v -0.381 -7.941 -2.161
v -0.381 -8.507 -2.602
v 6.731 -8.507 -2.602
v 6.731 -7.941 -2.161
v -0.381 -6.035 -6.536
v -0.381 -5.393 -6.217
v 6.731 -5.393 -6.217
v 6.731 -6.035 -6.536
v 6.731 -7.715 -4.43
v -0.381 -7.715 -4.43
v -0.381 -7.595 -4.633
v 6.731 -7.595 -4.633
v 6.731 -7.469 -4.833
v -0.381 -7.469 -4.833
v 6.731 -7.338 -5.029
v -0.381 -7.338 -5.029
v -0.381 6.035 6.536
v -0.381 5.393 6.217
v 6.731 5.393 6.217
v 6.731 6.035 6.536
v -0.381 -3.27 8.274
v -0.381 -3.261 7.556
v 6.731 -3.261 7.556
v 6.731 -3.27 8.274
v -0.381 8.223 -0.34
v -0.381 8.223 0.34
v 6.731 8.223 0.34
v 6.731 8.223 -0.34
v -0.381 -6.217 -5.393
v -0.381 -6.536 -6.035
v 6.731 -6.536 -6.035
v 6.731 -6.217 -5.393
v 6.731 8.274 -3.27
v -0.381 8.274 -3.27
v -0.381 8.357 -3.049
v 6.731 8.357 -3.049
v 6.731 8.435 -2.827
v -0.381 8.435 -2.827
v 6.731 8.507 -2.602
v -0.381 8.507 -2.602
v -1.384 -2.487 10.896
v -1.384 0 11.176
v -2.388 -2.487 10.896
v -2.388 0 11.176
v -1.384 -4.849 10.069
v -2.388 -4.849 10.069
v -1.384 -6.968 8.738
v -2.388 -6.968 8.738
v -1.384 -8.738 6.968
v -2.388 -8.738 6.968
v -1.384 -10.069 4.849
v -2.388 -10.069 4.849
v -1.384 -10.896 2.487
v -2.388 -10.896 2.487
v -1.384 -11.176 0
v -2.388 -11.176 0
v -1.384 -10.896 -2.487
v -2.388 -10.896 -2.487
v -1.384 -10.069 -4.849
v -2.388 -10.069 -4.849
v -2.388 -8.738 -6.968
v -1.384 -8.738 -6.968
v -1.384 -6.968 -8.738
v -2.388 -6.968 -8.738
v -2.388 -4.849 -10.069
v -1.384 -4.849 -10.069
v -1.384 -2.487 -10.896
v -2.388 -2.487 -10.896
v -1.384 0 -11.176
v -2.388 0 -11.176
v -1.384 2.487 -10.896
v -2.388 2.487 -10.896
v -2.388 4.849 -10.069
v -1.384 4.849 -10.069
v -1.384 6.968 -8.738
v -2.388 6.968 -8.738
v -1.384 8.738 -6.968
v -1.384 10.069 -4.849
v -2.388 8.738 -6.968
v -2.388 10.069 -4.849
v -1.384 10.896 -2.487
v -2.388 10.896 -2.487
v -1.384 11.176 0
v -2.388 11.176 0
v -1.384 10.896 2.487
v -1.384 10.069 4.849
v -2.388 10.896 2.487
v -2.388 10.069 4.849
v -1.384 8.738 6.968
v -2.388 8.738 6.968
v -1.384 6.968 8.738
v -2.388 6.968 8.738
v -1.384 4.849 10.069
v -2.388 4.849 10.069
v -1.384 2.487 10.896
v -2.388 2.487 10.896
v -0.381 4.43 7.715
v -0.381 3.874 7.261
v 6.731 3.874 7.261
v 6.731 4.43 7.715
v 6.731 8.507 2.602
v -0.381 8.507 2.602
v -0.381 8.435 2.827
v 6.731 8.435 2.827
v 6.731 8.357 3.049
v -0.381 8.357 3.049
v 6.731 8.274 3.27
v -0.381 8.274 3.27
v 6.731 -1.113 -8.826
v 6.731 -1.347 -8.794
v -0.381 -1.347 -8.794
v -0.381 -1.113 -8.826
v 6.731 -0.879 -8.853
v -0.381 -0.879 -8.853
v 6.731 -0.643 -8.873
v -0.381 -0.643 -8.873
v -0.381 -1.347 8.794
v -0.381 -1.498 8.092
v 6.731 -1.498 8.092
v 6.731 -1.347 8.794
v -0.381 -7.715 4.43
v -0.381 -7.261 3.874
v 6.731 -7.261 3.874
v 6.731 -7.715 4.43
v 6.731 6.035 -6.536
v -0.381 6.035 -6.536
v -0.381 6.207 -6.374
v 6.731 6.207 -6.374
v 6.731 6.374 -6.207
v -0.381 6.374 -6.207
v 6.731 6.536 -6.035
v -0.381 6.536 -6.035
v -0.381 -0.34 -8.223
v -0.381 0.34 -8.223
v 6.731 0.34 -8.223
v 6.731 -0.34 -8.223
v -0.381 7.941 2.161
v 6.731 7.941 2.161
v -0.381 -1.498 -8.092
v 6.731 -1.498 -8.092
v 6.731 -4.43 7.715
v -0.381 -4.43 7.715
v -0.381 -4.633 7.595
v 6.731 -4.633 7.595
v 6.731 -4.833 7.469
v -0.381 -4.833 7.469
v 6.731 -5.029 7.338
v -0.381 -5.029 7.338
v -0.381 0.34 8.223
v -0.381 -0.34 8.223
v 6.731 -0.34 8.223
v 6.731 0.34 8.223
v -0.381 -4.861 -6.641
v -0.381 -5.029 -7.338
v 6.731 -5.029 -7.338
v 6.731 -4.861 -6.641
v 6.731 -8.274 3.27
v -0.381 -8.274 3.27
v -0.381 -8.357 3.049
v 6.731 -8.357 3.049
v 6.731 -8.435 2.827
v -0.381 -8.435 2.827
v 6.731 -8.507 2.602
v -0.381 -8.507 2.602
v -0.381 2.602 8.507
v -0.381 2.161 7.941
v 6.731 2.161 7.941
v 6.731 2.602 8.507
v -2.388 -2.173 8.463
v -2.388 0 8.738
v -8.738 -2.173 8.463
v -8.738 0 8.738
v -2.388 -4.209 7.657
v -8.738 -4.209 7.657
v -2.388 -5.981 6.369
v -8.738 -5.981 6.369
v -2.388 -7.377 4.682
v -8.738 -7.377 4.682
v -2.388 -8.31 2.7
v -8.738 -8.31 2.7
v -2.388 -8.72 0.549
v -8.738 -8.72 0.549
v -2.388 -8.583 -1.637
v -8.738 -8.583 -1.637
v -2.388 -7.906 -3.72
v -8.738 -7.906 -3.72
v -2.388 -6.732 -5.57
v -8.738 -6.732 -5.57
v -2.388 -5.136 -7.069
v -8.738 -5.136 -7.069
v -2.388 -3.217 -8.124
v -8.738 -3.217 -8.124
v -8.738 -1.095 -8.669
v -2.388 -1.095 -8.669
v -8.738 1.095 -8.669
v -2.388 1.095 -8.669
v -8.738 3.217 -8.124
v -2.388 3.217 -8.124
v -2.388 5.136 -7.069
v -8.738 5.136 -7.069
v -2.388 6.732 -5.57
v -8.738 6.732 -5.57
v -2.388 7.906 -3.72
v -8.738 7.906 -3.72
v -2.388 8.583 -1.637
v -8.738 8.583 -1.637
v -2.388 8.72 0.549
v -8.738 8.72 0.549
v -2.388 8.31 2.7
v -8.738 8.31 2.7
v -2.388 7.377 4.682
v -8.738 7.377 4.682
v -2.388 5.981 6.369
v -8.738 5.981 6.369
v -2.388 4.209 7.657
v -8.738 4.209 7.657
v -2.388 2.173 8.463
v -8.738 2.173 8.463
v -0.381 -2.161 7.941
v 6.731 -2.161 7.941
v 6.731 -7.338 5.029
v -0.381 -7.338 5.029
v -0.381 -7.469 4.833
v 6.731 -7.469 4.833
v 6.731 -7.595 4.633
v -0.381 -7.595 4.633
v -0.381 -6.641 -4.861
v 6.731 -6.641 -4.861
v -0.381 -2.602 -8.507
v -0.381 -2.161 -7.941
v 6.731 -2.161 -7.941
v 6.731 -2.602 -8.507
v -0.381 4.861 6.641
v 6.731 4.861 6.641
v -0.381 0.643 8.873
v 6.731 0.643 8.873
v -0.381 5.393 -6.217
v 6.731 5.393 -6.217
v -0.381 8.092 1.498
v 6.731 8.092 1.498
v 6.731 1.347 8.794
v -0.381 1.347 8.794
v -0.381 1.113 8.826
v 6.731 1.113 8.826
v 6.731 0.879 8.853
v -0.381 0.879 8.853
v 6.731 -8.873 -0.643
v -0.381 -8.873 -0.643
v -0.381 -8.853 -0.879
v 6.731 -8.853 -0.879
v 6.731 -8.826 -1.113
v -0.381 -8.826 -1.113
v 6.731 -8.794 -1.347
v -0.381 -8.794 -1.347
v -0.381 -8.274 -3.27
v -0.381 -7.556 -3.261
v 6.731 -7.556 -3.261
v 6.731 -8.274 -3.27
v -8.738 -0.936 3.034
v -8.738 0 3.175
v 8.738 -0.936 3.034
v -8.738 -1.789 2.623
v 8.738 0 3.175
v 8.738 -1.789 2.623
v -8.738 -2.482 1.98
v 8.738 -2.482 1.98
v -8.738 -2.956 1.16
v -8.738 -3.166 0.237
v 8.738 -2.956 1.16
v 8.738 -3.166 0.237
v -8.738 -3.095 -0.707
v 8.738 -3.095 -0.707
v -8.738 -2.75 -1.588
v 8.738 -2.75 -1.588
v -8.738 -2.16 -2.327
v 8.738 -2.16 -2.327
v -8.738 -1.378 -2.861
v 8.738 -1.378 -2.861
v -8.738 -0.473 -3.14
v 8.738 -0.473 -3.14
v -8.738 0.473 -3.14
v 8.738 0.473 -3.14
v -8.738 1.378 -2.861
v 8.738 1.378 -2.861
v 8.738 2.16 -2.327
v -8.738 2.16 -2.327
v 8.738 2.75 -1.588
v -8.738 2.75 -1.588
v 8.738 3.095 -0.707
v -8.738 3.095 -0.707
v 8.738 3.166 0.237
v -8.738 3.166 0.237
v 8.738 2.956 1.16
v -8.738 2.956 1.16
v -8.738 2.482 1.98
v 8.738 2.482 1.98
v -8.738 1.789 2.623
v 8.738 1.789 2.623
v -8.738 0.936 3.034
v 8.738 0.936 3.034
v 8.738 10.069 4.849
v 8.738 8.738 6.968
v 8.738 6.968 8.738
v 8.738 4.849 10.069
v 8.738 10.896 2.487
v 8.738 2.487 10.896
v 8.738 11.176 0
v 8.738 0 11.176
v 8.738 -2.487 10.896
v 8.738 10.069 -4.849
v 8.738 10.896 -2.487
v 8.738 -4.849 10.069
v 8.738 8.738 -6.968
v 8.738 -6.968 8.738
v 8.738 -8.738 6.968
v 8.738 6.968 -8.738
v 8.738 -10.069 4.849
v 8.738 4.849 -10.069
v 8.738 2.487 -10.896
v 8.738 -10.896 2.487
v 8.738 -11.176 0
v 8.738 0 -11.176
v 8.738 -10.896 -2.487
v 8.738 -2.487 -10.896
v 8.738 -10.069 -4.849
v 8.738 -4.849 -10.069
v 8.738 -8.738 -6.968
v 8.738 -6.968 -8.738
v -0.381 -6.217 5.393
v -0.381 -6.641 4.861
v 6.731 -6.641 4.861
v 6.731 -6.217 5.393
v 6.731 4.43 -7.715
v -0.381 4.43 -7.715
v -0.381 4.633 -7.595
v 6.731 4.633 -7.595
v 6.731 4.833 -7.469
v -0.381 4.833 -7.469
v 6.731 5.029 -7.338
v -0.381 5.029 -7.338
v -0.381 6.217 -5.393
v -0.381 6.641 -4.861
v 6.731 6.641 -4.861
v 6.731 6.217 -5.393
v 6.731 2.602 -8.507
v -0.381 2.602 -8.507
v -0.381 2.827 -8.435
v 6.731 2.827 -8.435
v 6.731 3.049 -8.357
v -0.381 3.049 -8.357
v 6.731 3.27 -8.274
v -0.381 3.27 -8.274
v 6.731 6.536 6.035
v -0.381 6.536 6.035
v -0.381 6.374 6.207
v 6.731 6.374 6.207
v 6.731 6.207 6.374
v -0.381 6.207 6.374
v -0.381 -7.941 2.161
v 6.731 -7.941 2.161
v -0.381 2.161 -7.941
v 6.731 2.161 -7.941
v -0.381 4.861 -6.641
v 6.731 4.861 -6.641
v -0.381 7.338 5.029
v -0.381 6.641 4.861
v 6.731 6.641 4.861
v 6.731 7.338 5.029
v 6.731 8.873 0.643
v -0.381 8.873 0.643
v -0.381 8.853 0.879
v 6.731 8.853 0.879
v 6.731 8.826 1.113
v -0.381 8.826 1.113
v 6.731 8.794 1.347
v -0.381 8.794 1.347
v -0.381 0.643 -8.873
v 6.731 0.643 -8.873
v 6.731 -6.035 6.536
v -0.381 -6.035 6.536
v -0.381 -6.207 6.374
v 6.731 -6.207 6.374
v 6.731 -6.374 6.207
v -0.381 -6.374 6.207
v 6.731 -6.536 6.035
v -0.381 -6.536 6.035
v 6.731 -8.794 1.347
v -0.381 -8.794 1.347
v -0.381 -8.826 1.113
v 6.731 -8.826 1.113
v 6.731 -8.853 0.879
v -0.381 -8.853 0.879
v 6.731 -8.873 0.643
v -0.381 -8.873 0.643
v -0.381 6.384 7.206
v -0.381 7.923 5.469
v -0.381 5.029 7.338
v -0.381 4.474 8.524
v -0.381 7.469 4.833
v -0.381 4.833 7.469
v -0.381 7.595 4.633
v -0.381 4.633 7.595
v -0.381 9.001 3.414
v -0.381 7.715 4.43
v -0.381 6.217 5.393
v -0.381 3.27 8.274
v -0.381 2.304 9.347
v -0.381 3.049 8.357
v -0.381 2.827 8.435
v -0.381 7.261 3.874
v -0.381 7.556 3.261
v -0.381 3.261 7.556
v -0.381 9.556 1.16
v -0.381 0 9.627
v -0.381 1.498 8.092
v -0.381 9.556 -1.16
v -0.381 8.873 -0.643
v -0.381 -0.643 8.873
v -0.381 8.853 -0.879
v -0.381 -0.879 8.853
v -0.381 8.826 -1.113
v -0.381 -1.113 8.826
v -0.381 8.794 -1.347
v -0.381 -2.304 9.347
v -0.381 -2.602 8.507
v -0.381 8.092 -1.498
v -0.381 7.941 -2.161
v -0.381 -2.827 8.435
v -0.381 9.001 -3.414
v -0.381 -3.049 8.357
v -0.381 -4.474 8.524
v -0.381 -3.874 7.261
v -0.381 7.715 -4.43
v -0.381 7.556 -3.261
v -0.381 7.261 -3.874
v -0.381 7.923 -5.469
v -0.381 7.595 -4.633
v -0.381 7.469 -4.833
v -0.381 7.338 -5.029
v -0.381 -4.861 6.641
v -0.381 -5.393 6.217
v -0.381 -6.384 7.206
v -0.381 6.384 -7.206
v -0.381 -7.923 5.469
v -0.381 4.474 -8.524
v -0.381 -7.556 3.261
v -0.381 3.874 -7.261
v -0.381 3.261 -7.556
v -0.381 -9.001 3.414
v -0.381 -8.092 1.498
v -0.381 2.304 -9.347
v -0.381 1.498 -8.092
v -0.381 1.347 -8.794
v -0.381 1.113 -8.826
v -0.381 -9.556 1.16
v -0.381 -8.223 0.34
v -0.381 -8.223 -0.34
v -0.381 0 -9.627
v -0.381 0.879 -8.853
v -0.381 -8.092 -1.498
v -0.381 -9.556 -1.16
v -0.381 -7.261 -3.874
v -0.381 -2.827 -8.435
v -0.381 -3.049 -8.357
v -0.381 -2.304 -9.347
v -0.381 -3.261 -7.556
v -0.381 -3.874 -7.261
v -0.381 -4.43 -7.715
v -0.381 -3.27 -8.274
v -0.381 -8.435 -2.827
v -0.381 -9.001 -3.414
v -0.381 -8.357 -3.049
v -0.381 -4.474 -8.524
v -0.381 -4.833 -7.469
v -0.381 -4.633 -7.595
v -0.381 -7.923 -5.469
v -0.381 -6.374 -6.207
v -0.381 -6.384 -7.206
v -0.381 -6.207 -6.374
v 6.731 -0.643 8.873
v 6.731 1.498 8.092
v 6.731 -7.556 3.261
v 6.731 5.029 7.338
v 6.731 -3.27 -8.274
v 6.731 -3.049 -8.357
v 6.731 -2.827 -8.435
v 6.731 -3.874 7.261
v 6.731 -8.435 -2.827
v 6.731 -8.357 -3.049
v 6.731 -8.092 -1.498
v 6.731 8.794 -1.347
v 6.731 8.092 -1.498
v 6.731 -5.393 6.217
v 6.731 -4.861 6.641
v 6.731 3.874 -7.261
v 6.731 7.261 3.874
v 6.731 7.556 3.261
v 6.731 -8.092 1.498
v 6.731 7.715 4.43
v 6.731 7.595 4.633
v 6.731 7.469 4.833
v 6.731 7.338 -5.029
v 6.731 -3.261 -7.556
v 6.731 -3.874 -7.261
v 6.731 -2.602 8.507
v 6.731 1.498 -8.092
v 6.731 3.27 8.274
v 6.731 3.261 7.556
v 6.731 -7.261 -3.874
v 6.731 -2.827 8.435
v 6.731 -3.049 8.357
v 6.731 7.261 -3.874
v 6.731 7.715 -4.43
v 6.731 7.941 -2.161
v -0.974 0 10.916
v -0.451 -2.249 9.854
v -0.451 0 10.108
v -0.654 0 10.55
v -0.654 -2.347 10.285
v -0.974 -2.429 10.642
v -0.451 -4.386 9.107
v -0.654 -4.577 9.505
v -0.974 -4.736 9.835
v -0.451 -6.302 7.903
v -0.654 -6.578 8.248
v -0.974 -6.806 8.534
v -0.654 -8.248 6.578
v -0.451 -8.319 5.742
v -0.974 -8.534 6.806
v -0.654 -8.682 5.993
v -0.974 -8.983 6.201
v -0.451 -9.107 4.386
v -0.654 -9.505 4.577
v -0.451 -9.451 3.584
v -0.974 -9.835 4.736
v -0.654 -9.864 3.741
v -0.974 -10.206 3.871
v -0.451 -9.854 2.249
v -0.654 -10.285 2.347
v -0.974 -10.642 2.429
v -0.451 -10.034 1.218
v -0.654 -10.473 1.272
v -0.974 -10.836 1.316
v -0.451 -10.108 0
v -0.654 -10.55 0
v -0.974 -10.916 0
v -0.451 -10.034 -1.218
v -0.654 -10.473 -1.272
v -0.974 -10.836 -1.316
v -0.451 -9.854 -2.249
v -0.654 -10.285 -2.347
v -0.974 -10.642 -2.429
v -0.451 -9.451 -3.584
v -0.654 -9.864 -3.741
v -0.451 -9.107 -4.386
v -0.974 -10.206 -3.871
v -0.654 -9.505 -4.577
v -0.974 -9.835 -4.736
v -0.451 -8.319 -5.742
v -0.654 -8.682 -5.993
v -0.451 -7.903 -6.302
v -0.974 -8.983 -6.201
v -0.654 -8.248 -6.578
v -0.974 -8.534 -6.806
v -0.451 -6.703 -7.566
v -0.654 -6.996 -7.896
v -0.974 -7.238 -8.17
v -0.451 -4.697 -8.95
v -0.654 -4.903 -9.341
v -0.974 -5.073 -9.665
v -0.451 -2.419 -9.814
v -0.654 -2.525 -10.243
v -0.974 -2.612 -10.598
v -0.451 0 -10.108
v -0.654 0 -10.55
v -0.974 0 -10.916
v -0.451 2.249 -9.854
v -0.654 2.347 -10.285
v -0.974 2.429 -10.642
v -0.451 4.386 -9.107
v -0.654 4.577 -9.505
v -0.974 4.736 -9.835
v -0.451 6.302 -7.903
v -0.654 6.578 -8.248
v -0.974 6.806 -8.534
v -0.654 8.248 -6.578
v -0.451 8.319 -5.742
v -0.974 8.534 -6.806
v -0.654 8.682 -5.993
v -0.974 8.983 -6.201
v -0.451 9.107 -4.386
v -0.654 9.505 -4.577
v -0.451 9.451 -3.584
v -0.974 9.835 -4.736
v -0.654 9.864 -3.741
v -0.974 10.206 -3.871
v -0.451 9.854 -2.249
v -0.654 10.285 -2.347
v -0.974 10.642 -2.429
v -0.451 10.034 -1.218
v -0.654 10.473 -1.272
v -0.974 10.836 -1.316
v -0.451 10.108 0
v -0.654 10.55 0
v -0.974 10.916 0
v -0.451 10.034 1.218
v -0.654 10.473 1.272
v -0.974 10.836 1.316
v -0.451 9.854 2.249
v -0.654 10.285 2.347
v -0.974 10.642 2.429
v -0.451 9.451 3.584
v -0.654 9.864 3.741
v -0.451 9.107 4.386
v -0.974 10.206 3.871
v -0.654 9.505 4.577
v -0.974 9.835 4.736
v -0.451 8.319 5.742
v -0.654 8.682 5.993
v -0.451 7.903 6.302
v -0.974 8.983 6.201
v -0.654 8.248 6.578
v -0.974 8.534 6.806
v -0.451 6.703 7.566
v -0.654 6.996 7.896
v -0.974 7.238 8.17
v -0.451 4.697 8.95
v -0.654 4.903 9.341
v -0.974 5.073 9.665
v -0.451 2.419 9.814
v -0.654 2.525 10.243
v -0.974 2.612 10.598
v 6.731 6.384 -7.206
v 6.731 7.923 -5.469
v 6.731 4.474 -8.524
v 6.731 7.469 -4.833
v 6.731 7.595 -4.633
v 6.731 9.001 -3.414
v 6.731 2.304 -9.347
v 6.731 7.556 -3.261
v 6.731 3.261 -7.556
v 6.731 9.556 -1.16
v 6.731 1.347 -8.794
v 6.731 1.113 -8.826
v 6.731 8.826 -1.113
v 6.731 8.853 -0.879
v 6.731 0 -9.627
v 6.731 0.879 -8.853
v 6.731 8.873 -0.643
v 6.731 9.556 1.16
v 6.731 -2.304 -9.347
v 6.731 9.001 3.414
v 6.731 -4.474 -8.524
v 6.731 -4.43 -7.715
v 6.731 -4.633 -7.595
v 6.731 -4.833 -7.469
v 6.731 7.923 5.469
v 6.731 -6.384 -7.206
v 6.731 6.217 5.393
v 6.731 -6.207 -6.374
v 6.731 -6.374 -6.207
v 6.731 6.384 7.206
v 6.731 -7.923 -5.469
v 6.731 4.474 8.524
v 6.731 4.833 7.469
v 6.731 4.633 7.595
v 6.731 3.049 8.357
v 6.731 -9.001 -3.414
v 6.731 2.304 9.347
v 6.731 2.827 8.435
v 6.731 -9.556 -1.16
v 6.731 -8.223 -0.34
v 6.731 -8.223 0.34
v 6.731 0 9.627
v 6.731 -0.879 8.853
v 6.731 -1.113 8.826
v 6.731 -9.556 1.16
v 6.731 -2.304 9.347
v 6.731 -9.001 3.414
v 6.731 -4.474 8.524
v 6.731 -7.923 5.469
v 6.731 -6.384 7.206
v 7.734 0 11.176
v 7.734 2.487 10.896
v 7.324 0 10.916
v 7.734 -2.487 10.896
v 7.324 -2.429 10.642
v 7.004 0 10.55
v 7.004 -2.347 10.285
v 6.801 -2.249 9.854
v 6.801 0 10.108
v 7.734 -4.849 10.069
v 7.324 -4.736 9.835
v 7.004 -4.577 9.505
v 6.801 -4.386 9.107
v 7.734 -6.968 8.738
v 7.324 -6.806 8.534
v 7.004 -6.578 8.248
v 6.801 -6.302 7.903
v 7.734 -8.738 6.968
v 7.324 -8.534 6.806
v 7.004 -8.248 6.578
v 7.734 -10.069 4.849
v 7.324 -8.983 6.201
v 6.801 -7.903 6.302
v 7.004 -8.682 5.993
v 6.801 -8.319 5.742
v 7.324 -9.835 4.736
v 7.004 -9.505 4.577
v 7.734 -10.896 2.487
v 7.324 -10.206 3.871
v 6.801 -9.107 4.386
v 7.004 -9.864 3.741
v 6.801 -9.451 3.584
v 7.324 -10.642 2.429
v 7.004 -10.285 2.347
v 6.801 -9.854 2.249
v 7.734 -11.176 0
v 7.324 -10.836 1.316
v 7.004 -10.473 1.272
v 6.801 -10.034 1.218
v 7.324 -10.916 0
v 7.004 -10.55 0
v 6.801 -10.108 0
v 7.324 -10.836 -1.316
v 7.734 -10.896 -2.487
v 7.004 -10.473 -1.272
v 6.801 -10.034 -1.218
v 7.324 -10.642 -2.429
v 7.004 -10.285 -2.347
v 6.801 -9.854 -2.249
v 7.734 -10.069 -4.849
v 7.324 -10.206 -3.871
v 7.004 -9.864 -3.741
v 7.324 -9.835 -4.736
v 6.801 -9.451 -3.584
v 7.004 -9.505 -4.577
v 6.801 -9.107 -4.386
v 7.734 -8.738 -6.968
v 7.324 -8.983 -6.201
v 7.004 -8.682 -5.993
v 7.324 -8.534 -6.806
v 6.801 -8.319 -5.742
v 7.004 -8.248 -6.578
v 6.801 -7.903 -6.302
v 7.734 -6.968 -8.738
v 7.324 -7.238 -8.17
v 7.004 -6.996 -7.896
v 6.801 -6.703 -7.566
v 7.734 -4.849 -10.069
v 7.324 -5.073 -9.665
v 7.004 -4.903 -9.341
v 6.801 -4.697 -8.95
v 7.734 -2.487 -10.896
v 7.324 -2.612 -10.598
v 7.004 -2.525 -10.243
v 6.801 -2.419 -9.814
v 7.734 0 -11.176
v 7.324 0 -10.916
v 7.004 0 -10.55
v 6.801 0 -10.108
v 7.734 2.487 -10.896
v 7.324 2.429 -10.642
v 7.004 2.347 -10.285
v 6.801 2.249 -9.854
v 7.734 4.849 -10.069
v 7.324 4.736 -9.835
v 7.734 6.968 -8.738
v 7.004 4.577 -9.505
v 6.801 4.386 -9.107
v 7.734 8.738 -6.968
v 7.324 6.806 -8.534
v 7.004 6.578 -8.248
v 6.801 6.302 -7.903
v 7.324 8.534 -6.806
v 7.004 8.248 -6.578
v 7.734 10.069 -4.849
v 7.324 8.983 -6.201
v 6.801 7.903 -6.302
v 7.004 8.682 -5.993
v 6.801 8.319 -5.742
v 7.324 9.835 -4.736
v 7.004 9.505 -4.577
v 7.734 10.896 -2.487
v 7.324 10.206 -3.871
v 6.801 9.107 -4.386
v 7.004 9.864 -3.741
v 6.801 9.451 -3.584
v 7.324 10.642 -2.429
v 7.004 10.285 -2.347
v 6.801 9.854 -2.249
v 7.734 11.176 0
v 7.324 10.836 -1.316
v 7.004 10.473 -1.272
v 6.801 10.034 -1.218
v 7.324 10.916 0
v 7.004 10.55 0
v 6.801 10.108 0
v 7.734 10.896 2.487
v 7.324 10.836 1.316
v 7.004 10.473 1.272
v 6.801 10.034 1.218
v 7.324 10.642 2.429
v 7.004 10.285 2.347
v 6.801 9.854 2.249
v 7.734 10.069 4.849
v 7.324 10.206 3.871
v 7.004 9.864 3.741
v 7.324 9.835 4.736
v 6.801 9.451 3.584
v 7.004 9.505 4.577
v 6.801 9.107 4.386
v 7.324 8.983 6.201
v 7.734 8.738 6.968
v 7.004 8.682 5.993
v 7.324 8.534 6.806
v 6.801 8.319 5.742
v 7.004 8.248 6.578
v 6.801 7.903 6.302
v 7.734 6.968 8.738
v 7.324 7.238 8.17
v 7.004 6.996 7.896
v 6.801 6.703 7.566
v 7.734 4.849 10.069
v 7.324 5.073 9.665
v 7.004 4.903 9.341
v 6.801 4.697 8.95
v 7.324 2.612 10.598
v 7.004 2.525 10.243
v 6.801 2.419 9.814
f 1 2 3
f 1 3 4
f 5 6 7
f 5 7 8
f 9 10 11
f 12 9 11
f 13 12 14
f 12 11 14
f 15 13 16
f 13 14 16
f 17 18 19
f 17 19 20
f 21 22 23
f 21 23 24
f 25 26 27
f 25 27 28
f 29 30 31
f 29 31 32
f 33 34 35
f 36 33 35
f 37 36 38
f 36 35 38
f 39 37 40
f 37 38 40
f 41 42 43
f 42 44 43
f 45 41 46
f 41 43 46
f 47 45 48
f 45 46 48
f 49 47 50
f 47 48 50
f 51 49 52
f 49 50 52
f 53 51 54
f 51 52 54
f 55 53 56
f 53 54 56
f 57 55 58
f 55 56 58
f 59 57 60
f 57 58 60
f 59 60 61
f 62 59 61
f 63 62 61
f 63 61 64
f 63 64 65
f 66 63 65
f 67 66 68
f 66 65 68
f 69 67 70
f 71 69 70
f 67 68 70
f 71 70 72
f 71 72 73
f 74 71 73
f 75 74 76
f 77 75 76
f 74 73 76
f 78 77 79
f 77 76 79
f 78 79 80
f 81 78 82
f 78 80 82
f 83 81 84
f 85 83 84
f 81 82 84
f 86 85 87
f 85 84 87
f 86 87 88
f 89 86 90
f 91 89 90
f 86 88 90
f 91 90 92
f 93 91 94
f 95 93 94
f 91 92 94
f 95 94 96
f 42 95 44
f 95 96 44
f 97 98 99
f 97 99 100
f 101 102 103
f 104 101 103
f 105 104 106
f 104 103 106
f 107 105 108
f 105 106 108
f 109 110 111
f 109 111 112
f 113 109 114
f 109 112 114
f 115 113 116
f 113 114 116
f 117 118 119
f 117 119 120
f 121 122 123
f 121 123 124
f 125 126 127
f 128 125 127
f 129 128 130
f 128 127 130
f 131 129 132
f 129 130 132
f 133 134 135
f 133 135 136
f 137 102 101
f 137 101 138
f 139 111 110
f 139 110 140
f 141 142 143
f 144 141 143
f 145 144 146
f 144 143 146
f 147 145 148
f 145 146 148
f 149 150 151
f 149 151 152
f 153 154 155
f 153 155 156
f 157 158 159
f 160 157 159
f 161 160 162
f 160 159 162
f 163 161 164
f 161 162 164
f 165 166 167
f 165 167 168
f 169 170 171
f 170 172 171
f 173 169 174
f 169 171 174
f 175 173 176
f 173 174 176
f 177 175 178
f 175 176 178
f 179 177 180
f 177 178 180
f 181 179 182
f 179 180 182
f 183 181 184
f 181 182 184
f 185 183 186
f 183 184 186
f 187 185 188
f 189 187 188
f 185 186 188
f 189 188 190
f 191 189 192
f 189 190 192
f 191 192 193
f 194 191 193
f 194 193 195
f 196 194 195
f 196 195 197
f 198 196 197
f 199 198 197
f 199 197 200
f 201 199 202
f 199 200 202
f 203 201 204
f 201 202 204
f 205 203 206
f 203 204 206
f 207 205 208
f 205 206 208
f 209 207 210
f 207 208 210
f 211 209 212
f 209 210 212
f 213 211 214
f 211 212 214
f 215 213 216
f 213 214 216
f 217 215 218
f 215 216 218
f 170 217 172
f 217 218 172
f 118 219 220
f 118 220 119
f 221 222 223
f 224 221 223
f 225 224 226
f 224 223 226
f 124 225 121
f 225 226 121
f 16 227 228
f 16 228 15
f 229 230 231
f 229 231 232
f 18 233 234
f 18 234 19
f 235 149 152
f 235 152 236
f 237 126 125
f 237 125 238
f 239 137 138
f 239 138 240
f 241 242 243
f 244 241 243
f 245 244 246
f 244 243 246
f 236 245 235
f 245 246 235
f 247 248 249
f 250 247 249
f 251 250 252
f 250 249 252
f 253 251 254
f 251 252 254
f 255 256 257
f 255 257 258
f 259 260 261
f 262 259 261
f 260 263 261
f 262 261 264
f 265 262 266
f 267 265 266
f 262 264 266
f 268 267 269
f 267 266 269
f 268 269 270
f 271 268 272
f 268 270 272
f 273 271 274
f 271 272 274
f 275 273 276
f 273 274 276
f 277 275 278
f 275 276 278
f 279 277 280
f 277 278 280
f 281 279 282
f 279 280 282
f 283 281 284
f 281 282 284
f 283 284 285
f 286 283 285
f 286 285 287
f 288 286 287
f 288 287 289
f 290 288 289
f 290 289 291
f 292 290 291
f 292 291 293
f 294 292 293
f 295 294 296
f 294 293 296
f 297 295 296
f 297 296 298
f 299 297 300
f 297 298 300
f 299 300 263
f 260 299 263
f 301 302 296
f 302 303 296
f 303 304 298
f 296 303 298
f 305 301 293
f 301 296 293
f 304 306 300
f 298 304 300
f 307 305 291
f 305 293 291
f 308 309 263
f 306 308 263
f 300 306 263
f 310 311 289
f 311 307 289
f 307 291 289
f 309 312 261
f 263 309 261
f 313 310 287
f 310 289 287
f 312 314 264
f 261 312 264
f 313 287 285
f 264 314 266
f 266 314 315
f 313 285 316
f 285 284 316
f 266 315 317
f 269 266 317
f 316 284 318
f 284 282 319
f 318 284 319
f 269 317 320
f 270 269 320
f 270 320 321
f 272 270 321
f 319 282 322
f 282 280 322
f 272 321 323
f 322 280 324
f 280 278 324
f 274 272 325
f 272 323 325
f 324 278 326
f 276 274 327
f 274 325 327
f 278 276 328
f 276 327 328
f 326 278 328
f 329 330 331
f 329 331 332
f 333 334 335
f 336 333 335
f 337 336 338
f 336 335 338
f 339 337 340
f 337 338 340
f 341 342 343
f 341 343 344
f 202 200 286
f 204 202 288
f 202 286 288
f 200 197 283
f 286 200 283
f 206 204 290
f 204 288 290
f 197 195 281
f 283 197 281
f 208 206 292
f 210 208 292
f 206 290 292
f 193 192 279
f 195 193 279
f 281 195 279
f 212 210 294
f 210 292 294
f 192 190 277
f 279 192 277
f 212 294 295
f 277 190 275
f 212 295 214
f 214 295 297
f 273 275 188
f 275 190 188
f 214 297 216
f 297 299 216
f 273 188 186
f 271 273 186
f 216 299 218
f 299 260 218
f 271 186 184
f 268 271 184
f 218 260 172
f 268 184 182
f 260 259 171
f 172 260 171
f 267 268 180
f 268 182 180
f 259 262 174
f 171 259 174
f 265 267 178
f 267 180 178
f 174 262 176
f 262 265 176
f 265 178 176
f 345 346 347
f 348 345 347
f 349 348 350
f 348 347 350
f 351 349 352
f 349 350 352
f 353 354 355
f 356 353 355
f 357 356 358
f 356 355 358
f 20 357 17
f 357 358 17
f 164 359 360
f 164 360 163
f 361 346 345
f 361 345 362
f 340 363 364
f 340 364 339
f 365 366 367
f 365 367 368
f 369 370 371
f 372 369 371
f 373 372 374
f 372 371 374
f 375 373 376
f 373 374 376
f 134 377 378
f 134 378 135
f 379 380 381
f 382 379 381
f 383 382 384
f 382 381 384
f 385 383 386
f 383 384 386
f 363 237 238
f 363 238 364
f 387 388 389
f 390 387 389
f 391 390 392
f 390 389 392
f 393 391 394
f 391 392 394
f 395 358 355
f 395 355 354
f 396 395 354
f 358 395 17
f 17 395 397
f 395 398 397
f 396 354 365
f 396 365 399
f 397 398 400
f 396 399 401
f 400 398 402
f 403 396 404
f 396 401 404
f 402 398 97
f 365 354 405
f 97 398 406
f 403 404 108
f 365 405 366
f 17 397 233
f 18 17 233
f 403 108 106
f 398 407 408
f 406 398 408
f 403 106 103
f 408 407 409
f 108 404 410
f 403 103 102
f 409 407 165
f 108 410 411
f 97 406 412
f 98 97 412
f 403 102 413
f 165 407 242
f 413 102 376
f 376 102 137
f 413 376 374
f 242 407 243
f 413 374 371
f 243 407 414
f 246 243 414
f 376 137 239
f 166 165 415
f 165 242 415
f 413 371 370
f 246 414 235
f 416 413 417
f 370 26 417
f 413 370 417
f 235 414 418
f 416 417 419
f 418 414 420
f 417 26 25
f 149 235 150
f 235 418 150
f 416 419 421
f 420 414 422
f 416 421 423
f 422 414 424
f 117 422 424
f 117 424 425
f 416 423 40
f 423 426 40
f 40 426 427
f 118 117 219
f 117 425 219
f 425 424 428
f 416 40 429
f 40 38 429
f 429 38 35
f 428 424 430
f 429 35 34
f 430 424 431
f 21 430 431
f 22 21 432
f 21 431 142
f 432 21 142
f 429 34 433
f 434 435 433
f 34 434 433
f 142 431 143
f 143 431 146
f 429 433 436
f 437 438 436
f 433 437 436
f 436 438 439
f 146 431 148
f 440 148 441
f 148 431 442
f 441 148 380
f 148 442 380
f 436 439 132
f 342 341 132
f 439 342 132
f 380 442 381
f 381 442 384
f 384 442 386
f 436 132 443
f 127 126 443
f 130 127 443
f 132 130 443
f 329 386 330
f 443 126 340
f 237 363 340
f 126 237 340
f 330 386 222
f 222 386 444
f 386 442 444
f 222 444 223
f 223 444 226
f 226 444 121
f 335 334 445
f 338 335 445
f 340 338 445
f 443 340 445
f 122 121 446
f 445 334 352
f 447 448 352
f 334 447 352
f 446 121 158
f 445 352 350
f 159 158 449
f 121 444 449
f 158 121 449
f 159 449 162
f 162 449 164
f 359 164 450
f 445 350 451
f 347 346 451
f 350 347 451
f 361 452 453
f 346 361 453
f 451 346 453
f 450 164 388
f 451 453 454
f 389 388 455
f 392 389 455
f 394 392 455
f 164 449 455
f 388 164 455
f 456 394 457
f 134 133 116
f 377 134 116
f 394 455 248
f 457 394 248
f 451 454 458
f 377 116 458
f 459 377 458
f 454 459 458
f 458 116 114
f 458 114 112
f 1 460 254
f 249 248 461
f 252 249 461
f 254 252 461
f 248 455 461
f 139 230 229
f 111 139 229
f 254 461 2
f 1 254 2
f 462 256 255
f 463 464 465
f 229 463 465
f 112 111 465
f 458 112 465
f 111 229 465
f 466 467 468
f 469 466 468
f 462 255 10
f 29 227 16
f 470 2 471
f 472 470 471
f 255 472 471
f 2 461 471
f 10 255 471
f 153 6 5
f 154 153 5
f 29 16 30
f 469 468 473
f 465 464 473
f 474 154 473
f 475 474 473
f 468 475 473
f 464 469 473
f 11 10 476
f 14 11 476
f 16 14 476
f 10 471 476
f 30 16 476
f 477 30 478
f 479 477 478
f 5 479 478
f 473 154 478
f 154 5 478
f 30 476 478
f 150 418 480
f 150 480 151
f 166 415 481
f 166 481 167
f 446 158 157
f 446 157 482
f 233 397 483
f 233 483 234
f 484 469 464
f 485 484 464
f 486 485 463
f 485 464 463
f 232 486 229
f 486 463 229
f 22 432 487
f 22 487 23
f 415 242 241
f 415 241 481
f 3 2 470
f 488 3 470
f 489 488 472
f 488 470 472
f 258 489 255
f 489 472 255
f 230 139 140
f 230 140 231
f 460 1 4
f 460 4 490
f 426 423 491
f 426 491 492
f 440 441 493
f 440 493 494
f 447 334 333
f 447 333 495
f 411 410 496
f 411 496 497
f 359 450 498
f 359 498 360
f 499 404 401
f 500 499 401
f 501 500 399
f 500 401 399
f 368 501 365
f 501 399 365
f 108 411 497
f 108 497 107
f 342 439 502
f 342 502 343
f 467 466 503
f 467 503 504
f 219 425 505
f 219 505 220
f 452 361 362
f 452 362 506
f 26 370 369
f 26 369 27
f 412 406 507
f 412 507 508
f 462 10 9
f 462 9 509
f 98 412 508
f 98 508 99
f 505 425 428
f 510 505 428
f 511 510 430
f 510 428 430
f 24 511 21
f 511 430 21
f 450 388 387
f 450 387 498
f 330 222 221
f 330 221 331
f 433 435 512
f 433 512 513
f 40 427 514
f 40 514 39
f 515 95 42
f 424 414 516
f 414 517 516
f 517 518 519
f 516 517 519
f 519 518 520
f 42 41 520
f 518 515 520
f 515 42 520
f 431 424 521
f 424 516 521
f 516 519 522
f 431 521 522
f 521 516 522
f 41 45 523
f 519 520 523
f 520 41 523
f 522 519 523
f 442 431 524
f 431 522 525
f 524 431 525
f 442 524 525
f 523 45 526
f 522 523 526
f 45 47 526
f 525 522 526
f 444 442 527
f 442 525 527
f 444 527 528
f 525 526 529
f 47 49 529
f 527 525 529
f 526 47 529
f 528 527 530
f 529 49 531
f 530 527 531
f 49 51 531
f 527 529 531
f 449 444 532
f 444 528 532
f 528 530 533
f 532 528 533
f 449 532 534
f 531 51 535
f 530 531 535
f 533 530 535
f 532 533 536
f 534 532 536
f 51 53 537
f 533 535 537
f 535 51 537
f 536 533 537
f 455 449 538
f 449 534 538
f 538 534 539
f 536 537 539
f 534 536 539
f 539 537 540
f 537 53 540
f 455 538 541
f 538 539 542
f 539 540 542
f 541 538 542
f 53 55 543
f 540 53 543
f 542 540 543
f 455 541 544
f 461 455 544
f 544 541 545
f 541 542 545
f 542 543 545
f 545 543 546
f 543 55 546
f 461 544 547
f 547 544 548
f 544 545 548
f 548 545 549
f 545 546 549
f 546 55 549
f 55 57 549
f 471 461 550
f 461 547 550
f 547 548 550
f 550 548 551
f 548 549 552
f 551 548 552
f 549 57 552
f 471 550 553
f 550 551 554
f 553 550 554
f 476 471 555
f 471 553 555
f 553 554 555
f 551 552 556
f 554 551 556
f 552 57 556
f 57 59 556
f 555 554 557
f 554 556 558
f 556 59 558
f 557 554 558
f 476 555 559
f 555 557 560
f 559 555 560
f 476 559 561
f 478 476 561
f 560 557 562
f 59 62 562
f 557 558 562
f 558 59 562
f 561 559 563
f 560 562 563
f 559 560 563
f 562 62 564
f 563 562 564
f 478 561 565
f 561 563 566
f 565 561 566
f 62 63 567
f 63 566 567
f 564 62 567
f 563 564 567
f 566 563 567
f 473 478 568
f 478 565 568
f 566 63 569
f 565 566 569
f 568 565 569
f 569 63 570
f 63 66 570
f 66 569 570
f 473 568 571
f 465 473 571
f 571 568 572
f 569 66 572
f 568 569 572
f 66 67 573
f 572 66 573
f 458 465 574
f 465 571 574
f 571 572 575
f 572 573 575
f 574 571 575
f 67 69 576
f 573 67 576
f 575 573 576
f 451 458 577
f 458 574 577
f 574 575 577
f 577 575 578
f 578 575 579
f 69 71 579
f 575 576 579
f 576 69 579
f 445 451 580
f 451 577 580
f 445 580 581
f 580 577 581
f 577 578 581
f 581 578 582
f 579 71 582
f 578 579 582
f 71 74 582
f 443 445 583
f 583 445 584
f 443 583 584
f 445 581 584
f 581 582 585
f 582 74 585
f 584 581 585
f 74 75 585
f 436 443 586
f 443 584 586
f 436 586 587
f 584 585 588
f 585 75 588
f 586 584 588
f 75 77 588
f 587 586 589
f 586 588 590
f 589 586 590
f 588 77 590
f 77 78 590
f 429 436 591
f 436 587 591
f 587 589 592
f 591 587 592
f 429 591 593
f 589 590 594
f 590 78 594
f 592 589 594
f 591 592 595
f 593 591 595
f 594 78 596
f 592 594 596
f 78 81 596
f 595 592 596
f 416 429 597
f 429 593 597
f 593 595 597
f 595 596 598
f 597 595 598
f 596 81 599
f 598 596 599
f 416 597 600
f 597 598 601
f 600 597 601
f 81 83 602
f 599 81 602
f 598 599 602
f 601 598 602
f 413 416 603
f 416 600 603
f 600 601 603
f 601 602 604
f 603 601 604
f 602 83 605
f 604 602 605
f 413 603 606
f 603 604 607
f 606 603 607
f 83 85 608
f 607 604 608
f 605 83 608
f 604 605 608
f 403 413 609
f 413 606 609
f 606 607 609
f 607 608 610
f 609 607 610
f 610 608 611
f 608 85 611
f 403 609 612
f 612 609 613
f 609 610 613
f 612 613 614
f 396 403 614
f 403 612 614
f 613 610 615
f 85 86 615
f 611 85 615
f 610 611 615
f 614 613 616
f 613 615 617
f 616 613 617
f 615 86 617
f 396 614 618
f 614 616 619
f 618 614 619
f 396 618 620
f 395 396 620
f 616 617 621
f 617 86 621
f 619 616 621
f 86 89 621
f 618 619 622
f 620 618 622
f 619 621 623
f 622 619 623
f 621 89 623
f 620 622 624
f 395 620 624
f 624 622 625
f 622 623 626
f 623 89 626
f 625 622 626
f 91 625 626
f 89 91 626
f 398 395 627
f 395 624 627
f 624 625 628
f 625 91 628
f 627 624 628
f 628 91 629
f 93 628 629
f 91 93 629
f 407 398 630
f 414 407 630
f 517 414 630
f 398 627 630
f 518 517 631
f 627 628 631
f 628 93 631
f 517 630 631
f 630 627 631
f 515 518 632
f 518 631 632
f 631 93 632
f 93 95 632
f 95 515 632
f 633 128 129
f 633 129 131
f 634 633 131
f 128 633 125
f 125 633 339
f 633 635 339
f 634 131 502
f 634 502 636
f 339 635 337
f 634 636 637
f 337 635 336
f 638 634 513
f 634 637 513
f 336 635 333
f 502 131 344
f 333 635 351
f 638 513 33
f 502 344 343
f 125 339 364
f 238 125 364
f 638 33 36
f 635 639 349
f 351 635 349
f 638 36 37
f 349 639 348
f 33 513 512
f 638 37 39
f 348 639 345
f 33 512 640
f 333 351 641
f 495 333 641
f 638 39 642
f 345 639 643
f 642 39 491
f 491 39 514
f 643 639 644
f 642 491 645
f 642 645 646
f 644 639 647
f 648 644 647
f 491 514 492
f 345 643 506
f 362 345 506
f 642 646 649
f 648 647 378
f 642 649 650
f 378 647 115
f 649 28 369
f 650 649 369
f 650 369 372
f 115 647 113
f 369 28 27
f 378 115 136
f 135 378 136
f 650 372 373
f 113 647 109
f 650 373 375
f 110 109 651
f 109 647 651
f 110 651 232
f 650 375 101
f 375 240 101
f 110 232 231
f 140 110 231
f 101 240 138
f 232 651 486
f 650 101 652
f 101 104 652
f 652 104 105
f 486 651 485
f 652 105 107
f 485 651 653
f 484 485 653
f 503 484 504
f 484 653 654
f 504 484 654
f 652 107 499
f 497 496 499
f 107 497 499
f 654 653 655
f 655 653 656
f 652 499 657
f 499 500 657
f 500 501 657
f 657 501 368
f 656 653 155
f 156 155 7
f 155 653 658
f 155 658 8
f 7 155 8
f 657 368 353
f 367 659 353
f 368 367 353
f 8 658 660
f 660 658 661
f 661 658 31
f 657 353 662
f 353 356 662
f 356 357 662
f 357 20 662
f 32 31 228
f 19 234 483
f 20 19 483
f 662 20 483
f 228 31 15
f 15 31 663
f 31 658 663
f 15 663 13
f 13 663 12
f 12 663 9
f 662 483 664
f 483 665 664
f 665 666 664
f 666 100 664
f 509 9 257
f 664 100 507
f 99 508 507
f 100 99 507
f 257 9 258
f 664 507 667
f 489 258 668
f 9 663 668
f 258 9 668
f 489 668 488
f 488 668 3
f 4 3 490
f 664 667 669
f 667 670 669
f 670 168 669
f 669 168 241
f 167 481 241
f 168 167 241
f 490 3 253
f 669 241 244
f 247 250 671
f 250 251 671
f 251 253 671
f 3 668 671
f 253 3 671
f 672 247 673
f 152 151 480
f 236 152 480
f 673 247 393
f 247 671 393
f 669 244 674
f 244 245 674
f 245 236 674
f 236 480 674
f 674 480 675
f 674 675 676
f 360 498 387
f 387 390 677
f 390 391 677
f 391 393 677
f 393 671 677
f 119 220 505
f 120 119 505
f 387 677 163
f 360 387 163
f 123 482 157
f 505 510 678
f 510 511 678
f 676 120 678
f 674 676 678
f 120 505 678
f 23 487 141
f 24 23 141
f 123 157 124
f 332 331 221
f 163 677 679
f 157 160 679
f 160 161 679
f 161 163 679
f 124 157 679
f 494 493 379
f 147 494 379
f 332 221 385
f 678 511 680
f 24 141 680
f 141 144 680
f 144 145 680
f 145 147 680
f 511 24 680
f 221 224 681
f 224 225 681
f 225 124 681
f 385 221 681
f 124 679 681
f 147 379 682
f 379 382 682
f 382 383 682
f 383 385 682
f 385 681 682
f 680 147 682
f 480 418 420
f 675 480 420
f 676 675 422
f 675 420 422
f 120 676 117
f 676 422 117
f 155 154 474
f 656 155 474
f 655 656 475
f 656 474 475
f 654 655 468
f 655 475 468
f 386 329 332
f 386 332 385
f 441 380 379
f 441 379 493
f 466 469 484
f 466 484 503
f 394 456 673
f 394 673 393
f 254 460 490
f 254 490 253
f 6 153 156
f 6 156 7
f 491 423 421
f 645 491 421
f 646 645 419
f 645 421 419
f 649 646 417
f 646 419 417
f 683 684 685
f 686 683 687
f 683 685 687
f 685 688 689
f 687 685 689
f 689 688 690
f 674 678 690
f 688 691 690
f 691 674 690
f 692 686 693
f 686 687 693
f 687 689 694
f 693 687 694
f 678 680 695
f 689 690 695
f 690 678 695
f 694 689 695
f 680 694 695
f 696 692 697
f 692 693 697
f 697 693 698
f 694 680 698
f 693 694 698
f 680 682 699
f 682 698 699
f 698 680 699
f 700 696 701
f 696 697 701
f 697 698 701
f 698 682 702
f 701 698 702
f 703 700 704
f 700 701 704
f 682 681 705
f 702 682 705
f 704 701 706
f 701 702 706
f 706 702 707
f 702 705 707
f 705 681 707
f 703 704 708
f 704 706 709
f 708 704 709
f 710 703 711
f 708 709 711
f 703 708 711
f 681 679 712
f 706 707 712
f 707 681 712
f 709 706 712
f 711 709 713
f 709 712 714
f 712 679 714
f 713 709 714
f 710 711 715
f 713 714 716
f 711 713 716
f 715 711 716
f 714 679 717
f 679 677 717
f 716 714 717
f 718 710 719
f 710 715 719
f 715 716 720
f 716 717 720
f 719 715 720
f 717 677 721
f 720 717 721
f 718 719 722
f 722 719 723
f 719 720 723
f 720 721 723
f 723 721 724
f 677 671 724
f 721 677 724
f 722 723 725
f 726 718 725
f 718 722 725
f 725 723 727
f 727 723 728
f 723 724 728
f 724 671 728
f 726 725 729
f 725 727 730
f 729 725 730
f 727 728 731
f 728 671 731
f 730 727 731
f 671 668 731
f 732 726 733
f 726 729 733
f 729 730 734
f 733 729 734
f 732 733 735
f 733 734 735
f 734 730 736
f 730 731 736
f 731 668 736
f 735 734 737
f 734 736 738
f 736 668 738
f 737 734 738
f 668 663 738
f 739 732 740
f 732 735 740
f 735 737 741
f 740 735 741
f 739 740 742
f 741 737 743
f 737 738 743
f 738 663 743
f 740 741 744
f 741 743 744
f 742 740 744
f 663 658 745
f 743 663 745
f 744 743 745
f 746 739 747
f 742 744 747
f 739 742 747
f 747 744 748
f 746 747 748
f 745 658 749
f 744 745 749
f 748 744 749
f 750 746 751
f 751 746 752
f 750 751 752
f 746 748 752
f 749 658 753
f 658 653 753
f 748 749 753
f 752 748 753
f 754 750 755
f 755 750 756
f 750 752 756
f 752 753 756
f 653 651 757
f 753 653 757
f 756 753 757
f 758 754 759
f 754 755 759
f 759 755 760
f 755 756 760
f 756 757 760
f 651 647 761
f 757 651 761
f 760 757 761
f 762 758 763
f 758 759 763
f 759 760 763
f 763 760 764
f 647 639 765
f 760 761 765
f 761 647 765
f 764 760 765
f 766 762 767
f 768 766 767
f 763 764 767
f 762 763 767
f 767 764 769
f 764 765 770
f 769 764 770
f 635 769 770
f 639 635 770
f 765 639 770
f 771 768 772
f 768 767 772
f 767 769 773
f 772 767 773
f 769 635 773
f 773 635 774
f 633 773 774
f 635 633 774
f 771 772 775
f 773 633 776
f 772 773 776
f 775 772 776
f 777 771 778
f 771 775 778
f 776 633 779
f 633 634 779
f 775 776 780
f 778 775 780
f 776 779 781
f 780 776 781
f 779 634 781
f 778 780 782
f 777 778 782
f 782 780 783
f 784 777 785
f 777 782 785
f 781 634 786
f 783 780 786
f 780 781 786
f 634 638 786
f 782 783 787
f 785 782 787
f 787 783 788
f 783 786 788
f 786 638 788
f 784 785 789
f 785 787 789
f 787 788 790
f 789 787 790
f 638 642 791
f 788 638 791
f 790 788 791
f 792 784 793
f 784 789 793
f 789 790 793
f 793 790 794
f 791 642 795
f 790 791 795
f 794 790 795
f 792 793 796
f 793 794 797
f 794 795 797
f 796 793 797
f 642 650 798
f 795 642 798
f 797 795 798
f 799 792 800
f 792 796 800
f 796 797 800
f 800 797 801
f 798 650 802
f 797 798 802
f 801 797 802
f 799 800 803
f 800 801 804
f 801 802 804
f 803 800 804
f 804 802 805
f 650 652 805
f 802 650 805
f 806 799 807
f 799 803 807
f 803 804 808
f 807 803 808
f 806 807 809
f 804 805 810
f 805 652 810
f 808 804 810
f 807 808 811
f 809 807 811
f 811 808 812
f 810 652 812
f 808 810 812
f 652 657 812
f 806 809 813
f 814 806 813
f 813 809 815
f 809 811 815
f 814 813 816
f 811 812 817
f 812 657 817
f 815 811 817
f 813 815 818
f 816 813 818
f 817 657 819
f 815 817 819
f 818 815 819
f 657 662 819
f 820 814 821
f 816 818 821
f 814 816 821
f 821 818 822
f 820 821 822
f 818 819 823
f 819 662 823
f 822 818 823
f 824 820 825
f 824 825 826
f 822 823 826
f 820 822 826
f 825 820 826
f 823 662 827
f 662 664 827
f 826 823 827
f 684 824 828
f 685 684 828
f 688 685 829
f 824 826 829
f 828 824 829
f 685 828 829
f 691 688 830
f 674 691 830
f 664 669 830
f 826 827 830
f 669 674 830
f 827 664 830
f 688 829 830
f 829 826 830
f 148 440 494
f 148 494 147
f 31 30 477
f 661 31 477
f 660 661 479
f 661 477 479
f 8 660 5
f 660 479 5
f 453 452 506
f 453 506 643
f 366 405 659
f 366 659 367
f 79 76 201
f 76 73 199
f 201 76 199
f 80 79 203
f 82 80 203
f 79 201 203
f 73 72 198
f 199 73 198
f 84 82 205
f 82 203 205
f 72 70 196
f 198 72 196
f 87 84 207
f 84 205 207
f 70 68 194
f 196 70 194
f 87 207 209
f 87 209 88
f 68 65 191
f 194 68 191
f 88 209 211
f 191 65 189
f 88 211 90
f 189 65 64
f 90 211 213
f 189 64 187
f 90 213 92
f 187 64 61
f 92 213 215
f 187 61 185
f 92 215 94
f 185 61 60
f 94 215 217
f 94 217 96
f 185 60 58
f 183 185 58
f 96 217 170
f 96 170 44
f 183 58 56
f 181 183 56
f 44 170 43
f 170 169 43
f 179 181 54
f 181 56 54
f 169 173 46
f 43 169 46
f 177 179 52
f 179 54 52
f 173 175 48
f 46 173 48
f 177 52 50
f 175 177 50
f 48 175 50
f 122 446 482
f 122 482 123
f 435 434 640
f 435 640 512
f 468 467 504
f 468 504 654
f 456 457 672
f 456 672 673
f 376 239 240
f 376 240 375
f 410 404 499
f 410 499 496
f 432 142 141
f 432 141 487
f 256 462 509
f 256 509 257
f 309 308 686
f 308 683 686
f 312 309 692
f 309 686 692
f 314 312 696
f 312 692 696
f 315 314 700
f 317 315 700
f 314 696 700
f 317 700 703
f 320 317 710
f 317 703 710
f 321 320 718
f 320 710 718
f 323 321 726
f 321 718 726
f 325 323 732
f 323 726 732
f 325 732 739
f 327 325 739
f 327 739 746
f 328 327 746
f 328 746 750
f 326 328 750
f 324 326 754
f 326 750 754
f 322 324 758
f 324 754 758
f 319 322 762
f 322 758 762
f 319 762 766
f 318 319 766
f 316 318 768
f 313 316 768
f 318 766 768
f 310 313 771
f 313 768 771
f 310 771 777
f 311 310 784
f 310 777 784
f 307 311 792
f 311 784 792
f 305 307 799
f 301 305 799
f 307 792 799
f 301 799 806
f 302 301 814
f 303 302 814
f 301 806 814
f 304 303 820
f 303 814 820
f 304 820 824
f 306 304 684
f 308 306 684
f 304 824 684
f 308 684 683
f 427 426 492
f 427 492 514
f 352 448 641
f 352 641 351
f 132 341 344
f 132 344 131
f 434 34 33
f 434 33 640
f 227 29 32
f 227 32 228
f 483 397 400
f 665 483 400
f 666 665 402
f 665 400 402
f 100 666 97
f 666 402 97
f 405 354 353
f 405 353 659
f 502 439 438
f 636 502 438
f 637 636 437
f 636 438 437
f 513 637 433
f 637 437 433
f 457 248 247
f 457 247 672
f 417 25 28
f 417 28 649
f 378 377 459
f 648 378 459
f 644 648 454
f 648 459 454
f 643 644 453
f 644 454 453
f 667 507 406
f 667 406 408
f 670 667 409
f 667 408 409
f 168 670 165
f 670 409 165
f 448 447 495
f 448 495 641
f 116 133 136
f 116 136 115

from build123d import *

# Parameters (mm, degrees)
SKETCH4_R          = 9.0551
SKETCH4_R_2        = 8.89635
CUT_EXTRUDE2_DEPTH = 7.112
CUT_EXTRUDE1_DEPTH = 7.112
CIRPATTERN1_COUNT  = 28


with BuildPart() as part:
    # Sketch1 → Revolve1 (revolve)
    with BuildSketch(Plane.XY, mode=Mode.PRIVATE) as revolve1_sk:
        with BuildLine():
            Line((-8.7376, 3.175), (8.7376, 3.175))
            Line((8.7376, 3.175), (8.7376, 11.176))
            Line((8.7376, 11.176), (7.7343, 11.176))
            ThreePointArc((7.7343, 11.176), (7.003726949, 10.549537058), (6.731, 9.6266))
            Line((6.731, 9.6266), (6.731, 9.0551))
            Line((6.731, 9.0551), (-0.381, 9.0551))
            Line((-0.381, 9.0551), (-0.381, 9.6266))
            ThreePointArc((-0.381, 9.6266), (-0.653726949, 10.549537058), (-1.3843, 11.176))
            Line((-1.3843, 11.176), (-2.3876, 11.176))
            Line((-2.3876, 11.176), (-2.3876, 8.7376))
            Line((-2.3876, 8.7376), (-8.7376, 8.7376))
            Line((-8.7376, 8.7376), (-8.7376, 3.175))
        make_face()
    revolve(revolve1_sk.sketch.rotate(Axis((-8.7376, 0, 0), (1, 0, 0)), 90), axis=Axis((-8.7376, 0, 0), (1, 0, 0)))

    # Sketch4 → Cut-Extrude2 (cut)
    with BuildSketch(Plane(origin=(-0.381, 0, 0), x_dir=(0, 0, -1), z_dir=(1, 0, 0))):
        Circle(SKETCH4_R)
        Circle(SKETCH4_R_2, mode=Mode.SUBTRACT)
    extrude(amount=CUT_EXTRUDE2_DEPTH, mode=Mode.SUBTRACT)

    # Sketch3 → Cut-Extrude1 (cut)
    with BuildSketch(Plane(origin=(-0.381, 0, 0), x_dir=(0, 0, -1), z_dir=(1, 0, 0))):
        with BuildLine():
            Line((-0.643388094, 8.873054439), (-0.340062676, 8.222570981))
            Line((-0.340062676, 8.222570981), (0.340062676, 8.222570981))
            Line((0.340062676, 8.222570981), (0.643388094, 8.873054439))
            ThreePointArc((0.643388094, 8.873054439), (0, 8.89635), (-0.643388094, 8.873054439))
        make_face()
    cut_extrude1 = extrude(amount=CUT_EXTRUDE1_DEPTH, mode=Mode.SUBTRACT)

    # CirPattern1: Cut-Extrude1 ×28 about axis
    cirpattern1_axis = Axis((0, 0, 0), (1, 0, 0))
    for i in range(1, CIRPATTERN1_COUNT):
        add(cut_extrude1.rotate(cirpattern1_axis, i * 360 / CIRPATTERN1_COUNT), mode=Mode.SUBTRACT)


solid = part.part
